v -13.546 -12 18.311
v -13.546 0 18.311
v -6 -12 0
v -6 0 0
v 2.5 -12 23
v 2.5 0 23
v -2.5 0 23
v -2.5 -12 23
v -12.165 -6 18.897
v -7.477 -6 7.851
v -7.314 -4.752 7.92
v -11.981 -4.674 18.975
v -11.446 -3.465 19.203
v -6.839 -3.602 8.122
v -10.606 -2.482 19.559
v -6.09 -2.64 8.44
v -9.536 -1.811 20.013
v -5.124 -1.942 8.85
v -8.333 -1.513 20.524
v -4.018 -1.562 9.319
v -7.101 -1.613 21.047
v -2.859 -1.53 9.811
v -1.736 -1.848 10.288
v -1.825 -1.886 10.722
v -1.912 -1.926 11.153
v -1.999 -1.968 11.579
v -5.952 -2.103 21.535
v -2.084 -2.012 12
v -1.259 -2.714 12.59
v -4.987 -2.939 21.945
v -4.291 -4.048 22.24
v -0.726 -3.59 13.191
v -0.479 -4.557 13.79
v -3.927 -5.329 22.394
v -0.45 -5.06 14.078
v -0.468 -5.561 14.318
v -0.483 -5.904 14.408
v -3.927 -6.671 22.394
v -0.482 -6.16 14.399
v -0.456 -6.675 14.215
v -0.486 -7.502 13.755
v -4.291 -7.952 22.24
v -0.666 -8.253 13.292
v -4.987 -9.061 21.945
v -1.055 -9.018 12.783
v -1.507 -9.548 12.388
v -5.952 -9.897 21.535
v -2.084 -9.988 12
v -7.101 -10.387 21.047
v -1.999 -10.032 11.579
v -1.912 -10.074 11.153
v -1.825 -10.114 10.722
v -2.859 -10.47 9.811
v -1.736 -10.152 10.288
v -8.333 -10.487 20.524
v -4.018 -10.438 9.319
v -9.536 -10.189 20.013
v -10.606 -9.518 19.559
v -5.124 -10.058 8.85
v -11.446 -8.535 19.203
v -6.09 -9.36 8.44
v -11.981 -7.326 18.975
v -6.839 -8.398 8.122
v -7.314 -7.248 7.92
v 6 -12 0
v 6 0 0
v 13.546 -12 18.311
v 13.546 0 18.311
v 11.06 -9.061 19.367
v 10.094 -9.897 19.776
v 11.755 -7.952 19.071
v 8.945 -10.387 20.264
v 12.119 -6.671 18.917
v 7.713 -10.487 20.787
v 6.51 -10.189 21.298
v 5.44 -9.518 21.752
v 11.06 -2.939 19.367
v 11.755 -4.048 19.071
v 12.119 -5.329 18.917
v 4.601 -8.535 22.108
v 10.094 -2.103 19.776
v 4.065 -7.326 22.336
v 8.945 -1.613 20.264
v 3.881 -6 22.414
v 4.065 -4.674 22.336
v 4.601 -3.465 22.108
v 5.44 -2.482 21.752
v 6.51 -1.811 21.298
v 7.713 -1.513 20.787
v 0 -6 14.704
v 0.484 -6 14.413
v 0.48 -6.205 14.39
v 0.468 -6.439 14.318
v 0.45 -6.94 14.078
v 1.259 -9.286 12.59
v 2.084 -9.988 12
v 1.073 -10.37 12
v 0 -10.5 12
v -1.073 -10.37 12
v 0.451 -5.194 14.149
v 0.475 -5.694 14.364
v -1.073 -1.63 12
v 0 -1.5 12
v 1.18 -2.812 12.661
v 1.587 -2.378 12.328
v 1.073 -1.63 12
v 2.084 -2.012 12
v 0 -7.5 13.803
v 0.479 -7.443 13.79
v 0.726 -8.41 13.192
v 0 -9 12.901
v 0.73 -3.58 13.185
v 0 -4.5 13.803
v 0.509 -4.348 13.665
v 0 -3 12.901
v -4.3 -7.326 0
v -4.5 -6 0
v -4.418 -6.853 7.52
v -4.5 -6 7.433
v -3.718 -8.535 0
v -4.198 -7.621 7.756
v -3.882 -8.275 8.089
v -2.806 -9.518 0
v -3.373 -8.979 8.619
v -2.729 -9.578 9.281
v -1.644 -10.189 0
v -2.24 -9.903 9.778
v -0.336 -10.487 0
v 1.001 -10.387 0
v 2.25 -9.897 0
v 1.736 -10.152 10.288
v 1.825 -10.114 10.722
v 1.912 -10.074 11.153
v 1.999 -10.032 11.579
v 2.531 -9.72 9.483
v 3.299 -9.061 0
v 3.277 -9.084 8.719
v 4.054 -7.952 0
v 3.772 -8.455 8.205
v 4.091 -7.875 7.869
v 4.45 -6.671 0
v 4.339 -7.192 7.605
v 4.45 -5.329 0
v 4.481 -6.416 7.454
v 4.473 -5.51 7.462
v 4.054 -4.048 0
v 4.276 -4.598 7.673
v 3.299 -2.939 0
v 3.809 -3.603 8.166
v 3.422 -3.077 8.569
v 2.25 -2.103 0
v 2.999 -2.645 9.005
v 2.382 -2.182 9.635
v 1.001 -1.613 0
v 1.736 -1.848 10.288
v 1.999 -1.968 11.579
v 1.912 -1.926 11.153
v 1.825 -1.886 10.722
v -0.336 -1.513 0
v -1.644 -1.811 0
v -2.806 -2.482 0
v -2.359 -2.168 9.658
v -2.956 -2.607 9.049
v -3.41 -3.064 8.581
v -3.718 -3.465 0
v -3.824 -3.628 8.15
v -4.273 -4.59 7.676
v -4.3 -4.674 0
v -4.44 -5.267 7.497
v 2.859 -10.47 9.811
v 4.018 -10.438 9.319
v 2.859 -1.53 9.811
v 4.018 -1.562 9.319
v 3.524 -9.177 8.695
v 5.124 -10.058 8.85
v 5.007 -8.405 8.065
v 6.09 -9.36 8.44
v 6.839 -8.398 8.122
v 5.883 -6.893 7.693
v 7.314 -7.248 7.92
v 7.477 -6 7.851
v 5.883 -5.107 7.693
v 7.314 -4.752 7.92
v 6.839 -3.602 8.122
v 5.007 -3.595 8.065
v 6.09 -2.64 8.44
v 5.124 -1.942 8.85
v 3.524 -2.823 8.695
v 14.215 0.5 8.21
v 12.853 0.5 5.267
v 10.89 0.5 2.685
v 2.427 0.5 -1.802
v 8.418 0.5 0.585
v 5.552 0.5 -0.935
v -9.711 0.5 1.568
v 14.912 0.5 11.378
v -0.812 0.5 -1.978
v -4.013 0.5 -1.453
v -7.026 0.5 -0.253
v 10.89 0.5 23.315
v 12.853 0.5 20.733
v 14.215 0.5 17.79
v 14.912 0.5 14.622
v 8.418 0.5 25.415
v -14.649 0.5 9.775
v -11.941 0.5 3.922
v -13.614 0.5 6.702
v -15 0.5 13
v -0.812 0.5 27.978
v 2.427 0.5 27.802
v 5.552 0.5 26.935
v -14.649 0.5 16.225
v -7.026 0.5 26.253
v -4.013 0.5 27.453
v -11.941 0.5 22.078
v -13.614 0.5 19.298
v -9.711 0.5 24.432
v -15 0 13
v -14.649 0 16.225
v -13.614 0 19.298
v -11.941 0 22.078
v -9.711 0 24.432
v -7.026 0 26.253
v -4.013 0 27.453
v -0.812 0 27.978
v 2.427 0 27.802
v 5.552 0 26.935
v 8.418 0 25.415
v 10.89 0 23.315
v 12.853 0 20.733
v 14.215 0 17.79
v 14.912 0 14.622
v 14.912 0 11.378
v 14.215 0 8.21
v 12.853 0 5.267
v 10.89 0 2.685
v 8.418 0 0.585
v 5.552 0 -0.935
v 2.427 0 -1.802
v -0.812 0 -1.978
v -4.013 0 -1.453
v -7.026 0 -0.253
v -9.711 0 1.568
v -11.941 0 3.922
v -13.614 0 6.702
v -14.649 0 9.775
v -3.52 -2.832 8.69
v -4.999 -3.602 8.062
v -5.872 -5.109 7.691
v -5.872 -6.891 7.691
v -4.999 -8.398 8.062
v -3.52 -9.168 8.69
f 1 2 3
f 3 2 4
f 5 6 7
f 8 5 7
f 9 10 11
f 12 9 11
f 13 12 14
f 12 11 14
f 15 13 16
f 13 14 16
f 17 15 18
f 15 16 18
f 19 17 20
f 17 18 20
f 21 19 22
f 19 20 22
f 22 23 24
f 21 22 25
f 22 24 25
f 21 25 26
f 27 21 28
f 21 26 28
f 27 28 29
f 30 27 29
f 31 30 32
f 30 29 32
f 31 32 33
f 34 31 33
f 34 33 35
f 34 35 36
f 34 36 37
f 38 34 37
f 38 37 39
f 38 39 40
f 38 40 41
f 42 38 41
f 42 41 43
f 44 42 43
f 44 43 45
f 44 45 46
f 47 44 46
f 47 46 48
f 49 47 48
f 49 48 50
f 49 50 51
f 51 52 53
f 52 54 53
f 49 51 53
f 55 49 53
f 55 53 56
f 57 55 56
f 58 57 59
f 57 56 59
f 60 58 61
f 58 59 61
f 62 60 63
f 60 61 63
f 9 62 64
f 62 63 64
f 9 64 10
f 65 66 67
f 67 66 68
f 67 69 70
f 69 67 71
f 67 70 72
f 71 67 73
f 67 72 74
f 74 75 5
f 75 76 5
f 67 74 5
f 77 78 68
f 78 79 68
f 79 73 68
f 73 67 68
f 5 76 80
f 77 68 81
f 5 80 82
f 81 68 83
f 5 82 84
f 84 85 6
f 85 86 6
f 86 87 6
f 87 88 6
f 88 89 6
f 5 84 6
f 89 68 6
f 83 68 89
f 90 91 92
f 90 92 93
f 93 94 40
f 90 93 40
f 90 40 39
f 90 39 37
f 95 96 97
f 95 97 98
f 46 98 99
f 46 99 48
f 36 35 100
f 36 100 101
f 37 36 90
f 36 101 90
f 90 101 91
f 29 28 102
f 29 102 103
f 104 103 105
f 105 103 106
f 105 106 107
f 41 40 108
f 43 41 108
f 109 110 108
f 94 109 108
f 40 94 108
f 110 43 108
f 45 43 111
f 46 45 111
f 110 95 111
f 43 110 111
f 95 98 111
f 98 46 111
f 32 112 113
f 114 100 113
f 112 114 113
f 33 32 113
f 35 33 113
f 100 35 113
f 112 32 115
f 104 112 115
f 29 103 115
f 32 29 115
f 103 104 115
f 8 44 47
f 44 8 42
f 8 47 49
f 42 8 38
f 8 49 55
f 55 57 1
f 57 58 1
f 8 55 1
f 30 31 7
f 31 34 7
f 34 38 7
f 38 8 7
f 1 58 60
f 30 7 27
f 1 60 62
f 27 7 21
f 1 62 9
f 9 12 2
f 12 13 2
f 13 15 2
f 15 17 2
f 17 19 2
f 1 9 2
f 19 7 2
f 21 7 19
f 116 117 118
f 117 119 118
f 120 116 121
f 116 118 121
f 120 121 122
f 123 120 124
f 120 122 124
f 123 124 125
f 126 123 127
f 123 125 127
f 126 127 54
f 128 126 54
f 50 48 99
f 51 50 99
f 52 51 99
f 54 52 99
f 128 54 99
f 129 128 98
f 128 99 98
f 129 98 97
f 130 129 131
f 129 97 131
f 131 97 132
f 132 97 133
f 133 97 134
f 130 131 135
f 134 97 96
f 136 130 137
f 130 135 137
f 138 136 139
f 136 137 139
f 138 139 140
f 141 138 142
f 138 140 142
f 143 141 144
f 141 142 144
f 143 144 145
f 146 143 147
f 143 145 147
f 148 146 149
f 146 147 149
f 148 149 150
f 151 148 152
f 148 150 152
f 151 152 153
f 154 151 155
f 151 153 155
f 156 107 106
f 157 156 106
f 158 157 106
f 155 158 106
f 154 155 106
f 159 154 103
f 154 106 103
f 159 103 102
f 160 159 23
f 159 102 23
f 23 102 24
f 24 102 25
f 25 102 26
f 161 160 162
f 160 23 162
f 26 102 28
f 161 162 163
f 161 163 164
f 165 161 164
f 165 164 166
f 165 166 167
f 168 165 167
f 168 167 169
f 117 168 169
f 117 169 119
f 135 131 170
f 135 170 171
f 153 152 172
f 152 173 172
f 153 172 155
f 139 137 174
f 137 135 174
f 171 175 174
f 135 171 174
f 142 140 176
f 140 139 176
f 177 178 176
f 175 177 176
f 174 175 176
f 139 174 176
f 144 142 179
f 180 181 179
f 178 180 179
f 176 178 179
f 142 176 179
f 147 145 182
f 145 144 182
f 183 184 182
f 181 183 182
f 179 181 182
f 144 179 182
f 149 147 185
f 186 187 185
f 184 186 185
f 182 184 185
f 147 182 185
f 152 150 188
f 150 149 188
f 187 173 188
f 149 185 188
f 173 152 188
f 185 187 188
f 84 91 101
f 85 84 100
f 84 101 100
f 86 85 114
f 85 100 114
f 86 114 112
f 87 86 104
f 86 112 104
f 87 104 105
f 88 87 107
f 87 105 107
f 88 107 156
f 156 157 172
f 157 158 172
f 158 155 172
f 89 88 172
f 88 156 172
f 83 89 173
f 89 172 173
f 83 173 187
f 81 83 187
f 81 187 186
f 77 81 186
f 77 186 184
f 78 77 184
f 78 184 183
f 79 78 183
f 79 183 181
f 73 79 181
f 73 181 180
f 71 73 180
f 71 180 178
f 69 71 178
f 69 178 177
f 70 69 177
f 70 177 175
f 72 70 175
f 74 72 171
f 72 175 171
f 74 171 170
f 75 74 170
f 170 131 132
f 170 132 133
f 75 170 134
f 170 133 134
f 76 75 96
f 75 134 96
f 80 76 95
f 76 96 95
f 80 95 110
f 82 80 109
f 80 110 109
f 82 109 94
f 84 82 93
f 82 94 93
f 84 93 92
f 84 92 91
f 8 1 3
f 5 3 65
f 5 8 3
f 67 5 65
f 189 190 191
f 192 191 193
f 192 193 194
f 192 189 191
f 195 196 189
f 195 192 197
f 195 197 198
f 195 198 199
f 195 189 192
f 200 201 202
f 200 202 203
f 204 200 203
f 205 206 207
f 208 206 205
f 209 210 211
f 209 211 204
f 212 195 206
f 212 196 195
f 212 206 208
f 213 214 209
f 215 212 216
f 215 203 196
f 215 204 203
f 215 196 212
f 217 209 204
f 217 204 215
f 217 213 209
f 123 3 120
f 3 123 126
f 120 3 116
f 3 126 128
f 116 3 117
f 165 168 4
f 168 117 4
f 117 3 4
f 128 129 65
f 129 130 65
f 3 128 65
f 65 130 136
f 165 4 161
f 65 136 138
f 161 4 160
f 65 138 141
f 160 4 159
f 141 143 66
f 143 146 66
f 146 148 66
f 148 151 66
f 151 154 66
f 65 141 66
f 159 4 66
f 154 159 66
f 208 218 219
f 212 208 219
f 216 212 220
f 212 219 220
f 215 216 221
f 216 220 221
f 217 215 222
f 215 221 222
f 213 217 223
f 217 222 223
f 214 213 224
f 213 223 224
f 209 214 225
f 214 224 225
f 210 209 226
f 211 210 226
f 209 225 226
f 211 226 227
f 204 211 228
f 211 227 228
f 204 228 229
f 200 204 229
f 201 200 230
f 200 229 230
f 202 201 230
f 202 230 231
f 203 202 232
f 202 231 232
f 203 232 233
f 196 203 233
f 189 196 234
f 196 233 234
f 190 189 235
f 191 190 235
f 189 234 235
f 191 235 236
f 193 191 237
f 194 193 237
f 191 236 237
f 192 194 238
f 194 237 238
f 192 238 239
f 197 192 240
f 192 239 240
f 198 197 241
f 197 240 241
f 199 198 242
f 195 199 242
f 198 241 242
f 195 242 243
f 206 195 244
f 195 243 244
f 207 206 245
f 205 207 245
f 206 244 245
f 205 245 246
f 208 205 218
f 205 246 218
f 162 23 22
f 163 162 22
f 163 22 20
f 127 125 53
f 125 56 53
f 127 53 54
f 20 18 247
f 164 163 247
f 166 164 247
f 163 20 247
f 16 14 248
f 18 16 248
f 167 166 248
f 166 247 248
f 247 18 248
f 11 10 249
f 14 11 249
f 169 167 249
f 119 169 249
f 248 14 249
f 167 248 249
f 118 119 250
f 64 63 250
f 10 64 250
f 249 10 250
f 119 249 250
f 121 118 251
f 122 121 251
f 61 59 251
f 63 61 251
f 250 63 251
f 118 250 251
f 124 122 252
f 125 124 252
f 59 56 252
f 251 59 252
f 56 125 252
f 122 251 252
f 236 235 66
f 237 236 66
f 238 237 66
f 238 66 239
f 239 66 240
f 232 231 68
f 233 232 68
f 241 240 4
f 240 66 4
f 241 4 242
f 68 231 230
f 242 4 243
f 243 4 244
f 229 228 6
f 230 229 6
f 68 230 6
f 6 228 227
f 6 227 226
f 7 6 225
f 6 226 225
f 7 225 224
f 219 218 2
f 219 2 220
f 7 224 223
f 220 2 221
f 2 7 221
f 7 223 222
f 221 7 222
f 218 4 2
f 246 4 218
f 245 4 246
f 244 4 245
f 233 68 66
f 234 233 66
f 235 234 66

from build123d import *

# Parameters (mm, degrees)
F1_DEPTH = 12
F3_D     = 9
F3_DEPTH = 12
F3_TIP   = 2.7038727856
F5_D     = 9
F5_DEPTH = 12
F5_TIP   = 2.7038727856
F7_D     = 9
F7_DEPTH = 12
F7_TIP   = 2.7038727856
F8_R     = 15
F9_DEPTH = 0.5


with BuildPart() as f1:
    # F0 (on Front) → F1 (new body)
    with BuildSketch(Plane.XZ):
        Polygon((2.5, 23), (0, 23), (-2.5, 23), (-13.5460582414, 18.3112264581), (-6, 0), (0, 0), (6, 0), (13.5460582414, 18.3112264581), align=None)
    extrude(amount=F1_DEPTH)

    # F3
    with Locations(Plane(origin=(0, 0, 0), x_dir=(1, 0, 0), z_dir=(0, 0, -1))):
        with Locations((0, 6)):
            Hole(F3_D / 2, depth=F3_DEPTH)
            with Locations((0, 0, -(F3_DEPTH + F3_TIP / 2))):  # 118° drill point
                Cone(0, F3_D / 2, F3_TIP, mode=Mode.SUBTRACT)

    # F5
    with Locations(Plane(origin=(8.6540847408, 0, 20.3877460107), x_dir=(0.9205048535, 0, -0.3907311285), z_dir=(0.3907311285, 0, 0.9205048535))):
        with Locations((-0.6855538216, -6)):
            Hole(F5_D / 2, depth=F5_DEPTH)
            with Locations((0, 0, -(F5_DEPTH + F5_TIP / 2))):  # 118° drill point
                Cone(0, F5_D / 2, F5_TIP, mode=Mode.SUBTRACT)

    # F7
    with Locations(Plane(origin=(-8.6540847408, 0, 20.3877460107), x_dir=(0.9205048535, 0, 0.3907311285), z_dir=(-0.3907311285, 0, 0.9205048535))):
        with Locations((0.6855538216, -6)):
            Hole(F7_D / 2, depth=F7_DEPTH)
            with Locations((0, 0, -(F7_DEPTH + F7_TIP / 2))):  # 118° drill point
                Cone(0, F7_D / 2, F7_TIP, mode=Mode.SUBTRACT)

    # F8 (on face) → F9 (join)
    with BuildSketch(Plane(origin=(0, 0, 0), x_dir=(-1, 0, 0), z_dir=(0, 1, 0))):
        with Locations((0, 13)):
            Circle(F8_R)
    extrude(amount=F9_DEPTH)


solid = f1.part
